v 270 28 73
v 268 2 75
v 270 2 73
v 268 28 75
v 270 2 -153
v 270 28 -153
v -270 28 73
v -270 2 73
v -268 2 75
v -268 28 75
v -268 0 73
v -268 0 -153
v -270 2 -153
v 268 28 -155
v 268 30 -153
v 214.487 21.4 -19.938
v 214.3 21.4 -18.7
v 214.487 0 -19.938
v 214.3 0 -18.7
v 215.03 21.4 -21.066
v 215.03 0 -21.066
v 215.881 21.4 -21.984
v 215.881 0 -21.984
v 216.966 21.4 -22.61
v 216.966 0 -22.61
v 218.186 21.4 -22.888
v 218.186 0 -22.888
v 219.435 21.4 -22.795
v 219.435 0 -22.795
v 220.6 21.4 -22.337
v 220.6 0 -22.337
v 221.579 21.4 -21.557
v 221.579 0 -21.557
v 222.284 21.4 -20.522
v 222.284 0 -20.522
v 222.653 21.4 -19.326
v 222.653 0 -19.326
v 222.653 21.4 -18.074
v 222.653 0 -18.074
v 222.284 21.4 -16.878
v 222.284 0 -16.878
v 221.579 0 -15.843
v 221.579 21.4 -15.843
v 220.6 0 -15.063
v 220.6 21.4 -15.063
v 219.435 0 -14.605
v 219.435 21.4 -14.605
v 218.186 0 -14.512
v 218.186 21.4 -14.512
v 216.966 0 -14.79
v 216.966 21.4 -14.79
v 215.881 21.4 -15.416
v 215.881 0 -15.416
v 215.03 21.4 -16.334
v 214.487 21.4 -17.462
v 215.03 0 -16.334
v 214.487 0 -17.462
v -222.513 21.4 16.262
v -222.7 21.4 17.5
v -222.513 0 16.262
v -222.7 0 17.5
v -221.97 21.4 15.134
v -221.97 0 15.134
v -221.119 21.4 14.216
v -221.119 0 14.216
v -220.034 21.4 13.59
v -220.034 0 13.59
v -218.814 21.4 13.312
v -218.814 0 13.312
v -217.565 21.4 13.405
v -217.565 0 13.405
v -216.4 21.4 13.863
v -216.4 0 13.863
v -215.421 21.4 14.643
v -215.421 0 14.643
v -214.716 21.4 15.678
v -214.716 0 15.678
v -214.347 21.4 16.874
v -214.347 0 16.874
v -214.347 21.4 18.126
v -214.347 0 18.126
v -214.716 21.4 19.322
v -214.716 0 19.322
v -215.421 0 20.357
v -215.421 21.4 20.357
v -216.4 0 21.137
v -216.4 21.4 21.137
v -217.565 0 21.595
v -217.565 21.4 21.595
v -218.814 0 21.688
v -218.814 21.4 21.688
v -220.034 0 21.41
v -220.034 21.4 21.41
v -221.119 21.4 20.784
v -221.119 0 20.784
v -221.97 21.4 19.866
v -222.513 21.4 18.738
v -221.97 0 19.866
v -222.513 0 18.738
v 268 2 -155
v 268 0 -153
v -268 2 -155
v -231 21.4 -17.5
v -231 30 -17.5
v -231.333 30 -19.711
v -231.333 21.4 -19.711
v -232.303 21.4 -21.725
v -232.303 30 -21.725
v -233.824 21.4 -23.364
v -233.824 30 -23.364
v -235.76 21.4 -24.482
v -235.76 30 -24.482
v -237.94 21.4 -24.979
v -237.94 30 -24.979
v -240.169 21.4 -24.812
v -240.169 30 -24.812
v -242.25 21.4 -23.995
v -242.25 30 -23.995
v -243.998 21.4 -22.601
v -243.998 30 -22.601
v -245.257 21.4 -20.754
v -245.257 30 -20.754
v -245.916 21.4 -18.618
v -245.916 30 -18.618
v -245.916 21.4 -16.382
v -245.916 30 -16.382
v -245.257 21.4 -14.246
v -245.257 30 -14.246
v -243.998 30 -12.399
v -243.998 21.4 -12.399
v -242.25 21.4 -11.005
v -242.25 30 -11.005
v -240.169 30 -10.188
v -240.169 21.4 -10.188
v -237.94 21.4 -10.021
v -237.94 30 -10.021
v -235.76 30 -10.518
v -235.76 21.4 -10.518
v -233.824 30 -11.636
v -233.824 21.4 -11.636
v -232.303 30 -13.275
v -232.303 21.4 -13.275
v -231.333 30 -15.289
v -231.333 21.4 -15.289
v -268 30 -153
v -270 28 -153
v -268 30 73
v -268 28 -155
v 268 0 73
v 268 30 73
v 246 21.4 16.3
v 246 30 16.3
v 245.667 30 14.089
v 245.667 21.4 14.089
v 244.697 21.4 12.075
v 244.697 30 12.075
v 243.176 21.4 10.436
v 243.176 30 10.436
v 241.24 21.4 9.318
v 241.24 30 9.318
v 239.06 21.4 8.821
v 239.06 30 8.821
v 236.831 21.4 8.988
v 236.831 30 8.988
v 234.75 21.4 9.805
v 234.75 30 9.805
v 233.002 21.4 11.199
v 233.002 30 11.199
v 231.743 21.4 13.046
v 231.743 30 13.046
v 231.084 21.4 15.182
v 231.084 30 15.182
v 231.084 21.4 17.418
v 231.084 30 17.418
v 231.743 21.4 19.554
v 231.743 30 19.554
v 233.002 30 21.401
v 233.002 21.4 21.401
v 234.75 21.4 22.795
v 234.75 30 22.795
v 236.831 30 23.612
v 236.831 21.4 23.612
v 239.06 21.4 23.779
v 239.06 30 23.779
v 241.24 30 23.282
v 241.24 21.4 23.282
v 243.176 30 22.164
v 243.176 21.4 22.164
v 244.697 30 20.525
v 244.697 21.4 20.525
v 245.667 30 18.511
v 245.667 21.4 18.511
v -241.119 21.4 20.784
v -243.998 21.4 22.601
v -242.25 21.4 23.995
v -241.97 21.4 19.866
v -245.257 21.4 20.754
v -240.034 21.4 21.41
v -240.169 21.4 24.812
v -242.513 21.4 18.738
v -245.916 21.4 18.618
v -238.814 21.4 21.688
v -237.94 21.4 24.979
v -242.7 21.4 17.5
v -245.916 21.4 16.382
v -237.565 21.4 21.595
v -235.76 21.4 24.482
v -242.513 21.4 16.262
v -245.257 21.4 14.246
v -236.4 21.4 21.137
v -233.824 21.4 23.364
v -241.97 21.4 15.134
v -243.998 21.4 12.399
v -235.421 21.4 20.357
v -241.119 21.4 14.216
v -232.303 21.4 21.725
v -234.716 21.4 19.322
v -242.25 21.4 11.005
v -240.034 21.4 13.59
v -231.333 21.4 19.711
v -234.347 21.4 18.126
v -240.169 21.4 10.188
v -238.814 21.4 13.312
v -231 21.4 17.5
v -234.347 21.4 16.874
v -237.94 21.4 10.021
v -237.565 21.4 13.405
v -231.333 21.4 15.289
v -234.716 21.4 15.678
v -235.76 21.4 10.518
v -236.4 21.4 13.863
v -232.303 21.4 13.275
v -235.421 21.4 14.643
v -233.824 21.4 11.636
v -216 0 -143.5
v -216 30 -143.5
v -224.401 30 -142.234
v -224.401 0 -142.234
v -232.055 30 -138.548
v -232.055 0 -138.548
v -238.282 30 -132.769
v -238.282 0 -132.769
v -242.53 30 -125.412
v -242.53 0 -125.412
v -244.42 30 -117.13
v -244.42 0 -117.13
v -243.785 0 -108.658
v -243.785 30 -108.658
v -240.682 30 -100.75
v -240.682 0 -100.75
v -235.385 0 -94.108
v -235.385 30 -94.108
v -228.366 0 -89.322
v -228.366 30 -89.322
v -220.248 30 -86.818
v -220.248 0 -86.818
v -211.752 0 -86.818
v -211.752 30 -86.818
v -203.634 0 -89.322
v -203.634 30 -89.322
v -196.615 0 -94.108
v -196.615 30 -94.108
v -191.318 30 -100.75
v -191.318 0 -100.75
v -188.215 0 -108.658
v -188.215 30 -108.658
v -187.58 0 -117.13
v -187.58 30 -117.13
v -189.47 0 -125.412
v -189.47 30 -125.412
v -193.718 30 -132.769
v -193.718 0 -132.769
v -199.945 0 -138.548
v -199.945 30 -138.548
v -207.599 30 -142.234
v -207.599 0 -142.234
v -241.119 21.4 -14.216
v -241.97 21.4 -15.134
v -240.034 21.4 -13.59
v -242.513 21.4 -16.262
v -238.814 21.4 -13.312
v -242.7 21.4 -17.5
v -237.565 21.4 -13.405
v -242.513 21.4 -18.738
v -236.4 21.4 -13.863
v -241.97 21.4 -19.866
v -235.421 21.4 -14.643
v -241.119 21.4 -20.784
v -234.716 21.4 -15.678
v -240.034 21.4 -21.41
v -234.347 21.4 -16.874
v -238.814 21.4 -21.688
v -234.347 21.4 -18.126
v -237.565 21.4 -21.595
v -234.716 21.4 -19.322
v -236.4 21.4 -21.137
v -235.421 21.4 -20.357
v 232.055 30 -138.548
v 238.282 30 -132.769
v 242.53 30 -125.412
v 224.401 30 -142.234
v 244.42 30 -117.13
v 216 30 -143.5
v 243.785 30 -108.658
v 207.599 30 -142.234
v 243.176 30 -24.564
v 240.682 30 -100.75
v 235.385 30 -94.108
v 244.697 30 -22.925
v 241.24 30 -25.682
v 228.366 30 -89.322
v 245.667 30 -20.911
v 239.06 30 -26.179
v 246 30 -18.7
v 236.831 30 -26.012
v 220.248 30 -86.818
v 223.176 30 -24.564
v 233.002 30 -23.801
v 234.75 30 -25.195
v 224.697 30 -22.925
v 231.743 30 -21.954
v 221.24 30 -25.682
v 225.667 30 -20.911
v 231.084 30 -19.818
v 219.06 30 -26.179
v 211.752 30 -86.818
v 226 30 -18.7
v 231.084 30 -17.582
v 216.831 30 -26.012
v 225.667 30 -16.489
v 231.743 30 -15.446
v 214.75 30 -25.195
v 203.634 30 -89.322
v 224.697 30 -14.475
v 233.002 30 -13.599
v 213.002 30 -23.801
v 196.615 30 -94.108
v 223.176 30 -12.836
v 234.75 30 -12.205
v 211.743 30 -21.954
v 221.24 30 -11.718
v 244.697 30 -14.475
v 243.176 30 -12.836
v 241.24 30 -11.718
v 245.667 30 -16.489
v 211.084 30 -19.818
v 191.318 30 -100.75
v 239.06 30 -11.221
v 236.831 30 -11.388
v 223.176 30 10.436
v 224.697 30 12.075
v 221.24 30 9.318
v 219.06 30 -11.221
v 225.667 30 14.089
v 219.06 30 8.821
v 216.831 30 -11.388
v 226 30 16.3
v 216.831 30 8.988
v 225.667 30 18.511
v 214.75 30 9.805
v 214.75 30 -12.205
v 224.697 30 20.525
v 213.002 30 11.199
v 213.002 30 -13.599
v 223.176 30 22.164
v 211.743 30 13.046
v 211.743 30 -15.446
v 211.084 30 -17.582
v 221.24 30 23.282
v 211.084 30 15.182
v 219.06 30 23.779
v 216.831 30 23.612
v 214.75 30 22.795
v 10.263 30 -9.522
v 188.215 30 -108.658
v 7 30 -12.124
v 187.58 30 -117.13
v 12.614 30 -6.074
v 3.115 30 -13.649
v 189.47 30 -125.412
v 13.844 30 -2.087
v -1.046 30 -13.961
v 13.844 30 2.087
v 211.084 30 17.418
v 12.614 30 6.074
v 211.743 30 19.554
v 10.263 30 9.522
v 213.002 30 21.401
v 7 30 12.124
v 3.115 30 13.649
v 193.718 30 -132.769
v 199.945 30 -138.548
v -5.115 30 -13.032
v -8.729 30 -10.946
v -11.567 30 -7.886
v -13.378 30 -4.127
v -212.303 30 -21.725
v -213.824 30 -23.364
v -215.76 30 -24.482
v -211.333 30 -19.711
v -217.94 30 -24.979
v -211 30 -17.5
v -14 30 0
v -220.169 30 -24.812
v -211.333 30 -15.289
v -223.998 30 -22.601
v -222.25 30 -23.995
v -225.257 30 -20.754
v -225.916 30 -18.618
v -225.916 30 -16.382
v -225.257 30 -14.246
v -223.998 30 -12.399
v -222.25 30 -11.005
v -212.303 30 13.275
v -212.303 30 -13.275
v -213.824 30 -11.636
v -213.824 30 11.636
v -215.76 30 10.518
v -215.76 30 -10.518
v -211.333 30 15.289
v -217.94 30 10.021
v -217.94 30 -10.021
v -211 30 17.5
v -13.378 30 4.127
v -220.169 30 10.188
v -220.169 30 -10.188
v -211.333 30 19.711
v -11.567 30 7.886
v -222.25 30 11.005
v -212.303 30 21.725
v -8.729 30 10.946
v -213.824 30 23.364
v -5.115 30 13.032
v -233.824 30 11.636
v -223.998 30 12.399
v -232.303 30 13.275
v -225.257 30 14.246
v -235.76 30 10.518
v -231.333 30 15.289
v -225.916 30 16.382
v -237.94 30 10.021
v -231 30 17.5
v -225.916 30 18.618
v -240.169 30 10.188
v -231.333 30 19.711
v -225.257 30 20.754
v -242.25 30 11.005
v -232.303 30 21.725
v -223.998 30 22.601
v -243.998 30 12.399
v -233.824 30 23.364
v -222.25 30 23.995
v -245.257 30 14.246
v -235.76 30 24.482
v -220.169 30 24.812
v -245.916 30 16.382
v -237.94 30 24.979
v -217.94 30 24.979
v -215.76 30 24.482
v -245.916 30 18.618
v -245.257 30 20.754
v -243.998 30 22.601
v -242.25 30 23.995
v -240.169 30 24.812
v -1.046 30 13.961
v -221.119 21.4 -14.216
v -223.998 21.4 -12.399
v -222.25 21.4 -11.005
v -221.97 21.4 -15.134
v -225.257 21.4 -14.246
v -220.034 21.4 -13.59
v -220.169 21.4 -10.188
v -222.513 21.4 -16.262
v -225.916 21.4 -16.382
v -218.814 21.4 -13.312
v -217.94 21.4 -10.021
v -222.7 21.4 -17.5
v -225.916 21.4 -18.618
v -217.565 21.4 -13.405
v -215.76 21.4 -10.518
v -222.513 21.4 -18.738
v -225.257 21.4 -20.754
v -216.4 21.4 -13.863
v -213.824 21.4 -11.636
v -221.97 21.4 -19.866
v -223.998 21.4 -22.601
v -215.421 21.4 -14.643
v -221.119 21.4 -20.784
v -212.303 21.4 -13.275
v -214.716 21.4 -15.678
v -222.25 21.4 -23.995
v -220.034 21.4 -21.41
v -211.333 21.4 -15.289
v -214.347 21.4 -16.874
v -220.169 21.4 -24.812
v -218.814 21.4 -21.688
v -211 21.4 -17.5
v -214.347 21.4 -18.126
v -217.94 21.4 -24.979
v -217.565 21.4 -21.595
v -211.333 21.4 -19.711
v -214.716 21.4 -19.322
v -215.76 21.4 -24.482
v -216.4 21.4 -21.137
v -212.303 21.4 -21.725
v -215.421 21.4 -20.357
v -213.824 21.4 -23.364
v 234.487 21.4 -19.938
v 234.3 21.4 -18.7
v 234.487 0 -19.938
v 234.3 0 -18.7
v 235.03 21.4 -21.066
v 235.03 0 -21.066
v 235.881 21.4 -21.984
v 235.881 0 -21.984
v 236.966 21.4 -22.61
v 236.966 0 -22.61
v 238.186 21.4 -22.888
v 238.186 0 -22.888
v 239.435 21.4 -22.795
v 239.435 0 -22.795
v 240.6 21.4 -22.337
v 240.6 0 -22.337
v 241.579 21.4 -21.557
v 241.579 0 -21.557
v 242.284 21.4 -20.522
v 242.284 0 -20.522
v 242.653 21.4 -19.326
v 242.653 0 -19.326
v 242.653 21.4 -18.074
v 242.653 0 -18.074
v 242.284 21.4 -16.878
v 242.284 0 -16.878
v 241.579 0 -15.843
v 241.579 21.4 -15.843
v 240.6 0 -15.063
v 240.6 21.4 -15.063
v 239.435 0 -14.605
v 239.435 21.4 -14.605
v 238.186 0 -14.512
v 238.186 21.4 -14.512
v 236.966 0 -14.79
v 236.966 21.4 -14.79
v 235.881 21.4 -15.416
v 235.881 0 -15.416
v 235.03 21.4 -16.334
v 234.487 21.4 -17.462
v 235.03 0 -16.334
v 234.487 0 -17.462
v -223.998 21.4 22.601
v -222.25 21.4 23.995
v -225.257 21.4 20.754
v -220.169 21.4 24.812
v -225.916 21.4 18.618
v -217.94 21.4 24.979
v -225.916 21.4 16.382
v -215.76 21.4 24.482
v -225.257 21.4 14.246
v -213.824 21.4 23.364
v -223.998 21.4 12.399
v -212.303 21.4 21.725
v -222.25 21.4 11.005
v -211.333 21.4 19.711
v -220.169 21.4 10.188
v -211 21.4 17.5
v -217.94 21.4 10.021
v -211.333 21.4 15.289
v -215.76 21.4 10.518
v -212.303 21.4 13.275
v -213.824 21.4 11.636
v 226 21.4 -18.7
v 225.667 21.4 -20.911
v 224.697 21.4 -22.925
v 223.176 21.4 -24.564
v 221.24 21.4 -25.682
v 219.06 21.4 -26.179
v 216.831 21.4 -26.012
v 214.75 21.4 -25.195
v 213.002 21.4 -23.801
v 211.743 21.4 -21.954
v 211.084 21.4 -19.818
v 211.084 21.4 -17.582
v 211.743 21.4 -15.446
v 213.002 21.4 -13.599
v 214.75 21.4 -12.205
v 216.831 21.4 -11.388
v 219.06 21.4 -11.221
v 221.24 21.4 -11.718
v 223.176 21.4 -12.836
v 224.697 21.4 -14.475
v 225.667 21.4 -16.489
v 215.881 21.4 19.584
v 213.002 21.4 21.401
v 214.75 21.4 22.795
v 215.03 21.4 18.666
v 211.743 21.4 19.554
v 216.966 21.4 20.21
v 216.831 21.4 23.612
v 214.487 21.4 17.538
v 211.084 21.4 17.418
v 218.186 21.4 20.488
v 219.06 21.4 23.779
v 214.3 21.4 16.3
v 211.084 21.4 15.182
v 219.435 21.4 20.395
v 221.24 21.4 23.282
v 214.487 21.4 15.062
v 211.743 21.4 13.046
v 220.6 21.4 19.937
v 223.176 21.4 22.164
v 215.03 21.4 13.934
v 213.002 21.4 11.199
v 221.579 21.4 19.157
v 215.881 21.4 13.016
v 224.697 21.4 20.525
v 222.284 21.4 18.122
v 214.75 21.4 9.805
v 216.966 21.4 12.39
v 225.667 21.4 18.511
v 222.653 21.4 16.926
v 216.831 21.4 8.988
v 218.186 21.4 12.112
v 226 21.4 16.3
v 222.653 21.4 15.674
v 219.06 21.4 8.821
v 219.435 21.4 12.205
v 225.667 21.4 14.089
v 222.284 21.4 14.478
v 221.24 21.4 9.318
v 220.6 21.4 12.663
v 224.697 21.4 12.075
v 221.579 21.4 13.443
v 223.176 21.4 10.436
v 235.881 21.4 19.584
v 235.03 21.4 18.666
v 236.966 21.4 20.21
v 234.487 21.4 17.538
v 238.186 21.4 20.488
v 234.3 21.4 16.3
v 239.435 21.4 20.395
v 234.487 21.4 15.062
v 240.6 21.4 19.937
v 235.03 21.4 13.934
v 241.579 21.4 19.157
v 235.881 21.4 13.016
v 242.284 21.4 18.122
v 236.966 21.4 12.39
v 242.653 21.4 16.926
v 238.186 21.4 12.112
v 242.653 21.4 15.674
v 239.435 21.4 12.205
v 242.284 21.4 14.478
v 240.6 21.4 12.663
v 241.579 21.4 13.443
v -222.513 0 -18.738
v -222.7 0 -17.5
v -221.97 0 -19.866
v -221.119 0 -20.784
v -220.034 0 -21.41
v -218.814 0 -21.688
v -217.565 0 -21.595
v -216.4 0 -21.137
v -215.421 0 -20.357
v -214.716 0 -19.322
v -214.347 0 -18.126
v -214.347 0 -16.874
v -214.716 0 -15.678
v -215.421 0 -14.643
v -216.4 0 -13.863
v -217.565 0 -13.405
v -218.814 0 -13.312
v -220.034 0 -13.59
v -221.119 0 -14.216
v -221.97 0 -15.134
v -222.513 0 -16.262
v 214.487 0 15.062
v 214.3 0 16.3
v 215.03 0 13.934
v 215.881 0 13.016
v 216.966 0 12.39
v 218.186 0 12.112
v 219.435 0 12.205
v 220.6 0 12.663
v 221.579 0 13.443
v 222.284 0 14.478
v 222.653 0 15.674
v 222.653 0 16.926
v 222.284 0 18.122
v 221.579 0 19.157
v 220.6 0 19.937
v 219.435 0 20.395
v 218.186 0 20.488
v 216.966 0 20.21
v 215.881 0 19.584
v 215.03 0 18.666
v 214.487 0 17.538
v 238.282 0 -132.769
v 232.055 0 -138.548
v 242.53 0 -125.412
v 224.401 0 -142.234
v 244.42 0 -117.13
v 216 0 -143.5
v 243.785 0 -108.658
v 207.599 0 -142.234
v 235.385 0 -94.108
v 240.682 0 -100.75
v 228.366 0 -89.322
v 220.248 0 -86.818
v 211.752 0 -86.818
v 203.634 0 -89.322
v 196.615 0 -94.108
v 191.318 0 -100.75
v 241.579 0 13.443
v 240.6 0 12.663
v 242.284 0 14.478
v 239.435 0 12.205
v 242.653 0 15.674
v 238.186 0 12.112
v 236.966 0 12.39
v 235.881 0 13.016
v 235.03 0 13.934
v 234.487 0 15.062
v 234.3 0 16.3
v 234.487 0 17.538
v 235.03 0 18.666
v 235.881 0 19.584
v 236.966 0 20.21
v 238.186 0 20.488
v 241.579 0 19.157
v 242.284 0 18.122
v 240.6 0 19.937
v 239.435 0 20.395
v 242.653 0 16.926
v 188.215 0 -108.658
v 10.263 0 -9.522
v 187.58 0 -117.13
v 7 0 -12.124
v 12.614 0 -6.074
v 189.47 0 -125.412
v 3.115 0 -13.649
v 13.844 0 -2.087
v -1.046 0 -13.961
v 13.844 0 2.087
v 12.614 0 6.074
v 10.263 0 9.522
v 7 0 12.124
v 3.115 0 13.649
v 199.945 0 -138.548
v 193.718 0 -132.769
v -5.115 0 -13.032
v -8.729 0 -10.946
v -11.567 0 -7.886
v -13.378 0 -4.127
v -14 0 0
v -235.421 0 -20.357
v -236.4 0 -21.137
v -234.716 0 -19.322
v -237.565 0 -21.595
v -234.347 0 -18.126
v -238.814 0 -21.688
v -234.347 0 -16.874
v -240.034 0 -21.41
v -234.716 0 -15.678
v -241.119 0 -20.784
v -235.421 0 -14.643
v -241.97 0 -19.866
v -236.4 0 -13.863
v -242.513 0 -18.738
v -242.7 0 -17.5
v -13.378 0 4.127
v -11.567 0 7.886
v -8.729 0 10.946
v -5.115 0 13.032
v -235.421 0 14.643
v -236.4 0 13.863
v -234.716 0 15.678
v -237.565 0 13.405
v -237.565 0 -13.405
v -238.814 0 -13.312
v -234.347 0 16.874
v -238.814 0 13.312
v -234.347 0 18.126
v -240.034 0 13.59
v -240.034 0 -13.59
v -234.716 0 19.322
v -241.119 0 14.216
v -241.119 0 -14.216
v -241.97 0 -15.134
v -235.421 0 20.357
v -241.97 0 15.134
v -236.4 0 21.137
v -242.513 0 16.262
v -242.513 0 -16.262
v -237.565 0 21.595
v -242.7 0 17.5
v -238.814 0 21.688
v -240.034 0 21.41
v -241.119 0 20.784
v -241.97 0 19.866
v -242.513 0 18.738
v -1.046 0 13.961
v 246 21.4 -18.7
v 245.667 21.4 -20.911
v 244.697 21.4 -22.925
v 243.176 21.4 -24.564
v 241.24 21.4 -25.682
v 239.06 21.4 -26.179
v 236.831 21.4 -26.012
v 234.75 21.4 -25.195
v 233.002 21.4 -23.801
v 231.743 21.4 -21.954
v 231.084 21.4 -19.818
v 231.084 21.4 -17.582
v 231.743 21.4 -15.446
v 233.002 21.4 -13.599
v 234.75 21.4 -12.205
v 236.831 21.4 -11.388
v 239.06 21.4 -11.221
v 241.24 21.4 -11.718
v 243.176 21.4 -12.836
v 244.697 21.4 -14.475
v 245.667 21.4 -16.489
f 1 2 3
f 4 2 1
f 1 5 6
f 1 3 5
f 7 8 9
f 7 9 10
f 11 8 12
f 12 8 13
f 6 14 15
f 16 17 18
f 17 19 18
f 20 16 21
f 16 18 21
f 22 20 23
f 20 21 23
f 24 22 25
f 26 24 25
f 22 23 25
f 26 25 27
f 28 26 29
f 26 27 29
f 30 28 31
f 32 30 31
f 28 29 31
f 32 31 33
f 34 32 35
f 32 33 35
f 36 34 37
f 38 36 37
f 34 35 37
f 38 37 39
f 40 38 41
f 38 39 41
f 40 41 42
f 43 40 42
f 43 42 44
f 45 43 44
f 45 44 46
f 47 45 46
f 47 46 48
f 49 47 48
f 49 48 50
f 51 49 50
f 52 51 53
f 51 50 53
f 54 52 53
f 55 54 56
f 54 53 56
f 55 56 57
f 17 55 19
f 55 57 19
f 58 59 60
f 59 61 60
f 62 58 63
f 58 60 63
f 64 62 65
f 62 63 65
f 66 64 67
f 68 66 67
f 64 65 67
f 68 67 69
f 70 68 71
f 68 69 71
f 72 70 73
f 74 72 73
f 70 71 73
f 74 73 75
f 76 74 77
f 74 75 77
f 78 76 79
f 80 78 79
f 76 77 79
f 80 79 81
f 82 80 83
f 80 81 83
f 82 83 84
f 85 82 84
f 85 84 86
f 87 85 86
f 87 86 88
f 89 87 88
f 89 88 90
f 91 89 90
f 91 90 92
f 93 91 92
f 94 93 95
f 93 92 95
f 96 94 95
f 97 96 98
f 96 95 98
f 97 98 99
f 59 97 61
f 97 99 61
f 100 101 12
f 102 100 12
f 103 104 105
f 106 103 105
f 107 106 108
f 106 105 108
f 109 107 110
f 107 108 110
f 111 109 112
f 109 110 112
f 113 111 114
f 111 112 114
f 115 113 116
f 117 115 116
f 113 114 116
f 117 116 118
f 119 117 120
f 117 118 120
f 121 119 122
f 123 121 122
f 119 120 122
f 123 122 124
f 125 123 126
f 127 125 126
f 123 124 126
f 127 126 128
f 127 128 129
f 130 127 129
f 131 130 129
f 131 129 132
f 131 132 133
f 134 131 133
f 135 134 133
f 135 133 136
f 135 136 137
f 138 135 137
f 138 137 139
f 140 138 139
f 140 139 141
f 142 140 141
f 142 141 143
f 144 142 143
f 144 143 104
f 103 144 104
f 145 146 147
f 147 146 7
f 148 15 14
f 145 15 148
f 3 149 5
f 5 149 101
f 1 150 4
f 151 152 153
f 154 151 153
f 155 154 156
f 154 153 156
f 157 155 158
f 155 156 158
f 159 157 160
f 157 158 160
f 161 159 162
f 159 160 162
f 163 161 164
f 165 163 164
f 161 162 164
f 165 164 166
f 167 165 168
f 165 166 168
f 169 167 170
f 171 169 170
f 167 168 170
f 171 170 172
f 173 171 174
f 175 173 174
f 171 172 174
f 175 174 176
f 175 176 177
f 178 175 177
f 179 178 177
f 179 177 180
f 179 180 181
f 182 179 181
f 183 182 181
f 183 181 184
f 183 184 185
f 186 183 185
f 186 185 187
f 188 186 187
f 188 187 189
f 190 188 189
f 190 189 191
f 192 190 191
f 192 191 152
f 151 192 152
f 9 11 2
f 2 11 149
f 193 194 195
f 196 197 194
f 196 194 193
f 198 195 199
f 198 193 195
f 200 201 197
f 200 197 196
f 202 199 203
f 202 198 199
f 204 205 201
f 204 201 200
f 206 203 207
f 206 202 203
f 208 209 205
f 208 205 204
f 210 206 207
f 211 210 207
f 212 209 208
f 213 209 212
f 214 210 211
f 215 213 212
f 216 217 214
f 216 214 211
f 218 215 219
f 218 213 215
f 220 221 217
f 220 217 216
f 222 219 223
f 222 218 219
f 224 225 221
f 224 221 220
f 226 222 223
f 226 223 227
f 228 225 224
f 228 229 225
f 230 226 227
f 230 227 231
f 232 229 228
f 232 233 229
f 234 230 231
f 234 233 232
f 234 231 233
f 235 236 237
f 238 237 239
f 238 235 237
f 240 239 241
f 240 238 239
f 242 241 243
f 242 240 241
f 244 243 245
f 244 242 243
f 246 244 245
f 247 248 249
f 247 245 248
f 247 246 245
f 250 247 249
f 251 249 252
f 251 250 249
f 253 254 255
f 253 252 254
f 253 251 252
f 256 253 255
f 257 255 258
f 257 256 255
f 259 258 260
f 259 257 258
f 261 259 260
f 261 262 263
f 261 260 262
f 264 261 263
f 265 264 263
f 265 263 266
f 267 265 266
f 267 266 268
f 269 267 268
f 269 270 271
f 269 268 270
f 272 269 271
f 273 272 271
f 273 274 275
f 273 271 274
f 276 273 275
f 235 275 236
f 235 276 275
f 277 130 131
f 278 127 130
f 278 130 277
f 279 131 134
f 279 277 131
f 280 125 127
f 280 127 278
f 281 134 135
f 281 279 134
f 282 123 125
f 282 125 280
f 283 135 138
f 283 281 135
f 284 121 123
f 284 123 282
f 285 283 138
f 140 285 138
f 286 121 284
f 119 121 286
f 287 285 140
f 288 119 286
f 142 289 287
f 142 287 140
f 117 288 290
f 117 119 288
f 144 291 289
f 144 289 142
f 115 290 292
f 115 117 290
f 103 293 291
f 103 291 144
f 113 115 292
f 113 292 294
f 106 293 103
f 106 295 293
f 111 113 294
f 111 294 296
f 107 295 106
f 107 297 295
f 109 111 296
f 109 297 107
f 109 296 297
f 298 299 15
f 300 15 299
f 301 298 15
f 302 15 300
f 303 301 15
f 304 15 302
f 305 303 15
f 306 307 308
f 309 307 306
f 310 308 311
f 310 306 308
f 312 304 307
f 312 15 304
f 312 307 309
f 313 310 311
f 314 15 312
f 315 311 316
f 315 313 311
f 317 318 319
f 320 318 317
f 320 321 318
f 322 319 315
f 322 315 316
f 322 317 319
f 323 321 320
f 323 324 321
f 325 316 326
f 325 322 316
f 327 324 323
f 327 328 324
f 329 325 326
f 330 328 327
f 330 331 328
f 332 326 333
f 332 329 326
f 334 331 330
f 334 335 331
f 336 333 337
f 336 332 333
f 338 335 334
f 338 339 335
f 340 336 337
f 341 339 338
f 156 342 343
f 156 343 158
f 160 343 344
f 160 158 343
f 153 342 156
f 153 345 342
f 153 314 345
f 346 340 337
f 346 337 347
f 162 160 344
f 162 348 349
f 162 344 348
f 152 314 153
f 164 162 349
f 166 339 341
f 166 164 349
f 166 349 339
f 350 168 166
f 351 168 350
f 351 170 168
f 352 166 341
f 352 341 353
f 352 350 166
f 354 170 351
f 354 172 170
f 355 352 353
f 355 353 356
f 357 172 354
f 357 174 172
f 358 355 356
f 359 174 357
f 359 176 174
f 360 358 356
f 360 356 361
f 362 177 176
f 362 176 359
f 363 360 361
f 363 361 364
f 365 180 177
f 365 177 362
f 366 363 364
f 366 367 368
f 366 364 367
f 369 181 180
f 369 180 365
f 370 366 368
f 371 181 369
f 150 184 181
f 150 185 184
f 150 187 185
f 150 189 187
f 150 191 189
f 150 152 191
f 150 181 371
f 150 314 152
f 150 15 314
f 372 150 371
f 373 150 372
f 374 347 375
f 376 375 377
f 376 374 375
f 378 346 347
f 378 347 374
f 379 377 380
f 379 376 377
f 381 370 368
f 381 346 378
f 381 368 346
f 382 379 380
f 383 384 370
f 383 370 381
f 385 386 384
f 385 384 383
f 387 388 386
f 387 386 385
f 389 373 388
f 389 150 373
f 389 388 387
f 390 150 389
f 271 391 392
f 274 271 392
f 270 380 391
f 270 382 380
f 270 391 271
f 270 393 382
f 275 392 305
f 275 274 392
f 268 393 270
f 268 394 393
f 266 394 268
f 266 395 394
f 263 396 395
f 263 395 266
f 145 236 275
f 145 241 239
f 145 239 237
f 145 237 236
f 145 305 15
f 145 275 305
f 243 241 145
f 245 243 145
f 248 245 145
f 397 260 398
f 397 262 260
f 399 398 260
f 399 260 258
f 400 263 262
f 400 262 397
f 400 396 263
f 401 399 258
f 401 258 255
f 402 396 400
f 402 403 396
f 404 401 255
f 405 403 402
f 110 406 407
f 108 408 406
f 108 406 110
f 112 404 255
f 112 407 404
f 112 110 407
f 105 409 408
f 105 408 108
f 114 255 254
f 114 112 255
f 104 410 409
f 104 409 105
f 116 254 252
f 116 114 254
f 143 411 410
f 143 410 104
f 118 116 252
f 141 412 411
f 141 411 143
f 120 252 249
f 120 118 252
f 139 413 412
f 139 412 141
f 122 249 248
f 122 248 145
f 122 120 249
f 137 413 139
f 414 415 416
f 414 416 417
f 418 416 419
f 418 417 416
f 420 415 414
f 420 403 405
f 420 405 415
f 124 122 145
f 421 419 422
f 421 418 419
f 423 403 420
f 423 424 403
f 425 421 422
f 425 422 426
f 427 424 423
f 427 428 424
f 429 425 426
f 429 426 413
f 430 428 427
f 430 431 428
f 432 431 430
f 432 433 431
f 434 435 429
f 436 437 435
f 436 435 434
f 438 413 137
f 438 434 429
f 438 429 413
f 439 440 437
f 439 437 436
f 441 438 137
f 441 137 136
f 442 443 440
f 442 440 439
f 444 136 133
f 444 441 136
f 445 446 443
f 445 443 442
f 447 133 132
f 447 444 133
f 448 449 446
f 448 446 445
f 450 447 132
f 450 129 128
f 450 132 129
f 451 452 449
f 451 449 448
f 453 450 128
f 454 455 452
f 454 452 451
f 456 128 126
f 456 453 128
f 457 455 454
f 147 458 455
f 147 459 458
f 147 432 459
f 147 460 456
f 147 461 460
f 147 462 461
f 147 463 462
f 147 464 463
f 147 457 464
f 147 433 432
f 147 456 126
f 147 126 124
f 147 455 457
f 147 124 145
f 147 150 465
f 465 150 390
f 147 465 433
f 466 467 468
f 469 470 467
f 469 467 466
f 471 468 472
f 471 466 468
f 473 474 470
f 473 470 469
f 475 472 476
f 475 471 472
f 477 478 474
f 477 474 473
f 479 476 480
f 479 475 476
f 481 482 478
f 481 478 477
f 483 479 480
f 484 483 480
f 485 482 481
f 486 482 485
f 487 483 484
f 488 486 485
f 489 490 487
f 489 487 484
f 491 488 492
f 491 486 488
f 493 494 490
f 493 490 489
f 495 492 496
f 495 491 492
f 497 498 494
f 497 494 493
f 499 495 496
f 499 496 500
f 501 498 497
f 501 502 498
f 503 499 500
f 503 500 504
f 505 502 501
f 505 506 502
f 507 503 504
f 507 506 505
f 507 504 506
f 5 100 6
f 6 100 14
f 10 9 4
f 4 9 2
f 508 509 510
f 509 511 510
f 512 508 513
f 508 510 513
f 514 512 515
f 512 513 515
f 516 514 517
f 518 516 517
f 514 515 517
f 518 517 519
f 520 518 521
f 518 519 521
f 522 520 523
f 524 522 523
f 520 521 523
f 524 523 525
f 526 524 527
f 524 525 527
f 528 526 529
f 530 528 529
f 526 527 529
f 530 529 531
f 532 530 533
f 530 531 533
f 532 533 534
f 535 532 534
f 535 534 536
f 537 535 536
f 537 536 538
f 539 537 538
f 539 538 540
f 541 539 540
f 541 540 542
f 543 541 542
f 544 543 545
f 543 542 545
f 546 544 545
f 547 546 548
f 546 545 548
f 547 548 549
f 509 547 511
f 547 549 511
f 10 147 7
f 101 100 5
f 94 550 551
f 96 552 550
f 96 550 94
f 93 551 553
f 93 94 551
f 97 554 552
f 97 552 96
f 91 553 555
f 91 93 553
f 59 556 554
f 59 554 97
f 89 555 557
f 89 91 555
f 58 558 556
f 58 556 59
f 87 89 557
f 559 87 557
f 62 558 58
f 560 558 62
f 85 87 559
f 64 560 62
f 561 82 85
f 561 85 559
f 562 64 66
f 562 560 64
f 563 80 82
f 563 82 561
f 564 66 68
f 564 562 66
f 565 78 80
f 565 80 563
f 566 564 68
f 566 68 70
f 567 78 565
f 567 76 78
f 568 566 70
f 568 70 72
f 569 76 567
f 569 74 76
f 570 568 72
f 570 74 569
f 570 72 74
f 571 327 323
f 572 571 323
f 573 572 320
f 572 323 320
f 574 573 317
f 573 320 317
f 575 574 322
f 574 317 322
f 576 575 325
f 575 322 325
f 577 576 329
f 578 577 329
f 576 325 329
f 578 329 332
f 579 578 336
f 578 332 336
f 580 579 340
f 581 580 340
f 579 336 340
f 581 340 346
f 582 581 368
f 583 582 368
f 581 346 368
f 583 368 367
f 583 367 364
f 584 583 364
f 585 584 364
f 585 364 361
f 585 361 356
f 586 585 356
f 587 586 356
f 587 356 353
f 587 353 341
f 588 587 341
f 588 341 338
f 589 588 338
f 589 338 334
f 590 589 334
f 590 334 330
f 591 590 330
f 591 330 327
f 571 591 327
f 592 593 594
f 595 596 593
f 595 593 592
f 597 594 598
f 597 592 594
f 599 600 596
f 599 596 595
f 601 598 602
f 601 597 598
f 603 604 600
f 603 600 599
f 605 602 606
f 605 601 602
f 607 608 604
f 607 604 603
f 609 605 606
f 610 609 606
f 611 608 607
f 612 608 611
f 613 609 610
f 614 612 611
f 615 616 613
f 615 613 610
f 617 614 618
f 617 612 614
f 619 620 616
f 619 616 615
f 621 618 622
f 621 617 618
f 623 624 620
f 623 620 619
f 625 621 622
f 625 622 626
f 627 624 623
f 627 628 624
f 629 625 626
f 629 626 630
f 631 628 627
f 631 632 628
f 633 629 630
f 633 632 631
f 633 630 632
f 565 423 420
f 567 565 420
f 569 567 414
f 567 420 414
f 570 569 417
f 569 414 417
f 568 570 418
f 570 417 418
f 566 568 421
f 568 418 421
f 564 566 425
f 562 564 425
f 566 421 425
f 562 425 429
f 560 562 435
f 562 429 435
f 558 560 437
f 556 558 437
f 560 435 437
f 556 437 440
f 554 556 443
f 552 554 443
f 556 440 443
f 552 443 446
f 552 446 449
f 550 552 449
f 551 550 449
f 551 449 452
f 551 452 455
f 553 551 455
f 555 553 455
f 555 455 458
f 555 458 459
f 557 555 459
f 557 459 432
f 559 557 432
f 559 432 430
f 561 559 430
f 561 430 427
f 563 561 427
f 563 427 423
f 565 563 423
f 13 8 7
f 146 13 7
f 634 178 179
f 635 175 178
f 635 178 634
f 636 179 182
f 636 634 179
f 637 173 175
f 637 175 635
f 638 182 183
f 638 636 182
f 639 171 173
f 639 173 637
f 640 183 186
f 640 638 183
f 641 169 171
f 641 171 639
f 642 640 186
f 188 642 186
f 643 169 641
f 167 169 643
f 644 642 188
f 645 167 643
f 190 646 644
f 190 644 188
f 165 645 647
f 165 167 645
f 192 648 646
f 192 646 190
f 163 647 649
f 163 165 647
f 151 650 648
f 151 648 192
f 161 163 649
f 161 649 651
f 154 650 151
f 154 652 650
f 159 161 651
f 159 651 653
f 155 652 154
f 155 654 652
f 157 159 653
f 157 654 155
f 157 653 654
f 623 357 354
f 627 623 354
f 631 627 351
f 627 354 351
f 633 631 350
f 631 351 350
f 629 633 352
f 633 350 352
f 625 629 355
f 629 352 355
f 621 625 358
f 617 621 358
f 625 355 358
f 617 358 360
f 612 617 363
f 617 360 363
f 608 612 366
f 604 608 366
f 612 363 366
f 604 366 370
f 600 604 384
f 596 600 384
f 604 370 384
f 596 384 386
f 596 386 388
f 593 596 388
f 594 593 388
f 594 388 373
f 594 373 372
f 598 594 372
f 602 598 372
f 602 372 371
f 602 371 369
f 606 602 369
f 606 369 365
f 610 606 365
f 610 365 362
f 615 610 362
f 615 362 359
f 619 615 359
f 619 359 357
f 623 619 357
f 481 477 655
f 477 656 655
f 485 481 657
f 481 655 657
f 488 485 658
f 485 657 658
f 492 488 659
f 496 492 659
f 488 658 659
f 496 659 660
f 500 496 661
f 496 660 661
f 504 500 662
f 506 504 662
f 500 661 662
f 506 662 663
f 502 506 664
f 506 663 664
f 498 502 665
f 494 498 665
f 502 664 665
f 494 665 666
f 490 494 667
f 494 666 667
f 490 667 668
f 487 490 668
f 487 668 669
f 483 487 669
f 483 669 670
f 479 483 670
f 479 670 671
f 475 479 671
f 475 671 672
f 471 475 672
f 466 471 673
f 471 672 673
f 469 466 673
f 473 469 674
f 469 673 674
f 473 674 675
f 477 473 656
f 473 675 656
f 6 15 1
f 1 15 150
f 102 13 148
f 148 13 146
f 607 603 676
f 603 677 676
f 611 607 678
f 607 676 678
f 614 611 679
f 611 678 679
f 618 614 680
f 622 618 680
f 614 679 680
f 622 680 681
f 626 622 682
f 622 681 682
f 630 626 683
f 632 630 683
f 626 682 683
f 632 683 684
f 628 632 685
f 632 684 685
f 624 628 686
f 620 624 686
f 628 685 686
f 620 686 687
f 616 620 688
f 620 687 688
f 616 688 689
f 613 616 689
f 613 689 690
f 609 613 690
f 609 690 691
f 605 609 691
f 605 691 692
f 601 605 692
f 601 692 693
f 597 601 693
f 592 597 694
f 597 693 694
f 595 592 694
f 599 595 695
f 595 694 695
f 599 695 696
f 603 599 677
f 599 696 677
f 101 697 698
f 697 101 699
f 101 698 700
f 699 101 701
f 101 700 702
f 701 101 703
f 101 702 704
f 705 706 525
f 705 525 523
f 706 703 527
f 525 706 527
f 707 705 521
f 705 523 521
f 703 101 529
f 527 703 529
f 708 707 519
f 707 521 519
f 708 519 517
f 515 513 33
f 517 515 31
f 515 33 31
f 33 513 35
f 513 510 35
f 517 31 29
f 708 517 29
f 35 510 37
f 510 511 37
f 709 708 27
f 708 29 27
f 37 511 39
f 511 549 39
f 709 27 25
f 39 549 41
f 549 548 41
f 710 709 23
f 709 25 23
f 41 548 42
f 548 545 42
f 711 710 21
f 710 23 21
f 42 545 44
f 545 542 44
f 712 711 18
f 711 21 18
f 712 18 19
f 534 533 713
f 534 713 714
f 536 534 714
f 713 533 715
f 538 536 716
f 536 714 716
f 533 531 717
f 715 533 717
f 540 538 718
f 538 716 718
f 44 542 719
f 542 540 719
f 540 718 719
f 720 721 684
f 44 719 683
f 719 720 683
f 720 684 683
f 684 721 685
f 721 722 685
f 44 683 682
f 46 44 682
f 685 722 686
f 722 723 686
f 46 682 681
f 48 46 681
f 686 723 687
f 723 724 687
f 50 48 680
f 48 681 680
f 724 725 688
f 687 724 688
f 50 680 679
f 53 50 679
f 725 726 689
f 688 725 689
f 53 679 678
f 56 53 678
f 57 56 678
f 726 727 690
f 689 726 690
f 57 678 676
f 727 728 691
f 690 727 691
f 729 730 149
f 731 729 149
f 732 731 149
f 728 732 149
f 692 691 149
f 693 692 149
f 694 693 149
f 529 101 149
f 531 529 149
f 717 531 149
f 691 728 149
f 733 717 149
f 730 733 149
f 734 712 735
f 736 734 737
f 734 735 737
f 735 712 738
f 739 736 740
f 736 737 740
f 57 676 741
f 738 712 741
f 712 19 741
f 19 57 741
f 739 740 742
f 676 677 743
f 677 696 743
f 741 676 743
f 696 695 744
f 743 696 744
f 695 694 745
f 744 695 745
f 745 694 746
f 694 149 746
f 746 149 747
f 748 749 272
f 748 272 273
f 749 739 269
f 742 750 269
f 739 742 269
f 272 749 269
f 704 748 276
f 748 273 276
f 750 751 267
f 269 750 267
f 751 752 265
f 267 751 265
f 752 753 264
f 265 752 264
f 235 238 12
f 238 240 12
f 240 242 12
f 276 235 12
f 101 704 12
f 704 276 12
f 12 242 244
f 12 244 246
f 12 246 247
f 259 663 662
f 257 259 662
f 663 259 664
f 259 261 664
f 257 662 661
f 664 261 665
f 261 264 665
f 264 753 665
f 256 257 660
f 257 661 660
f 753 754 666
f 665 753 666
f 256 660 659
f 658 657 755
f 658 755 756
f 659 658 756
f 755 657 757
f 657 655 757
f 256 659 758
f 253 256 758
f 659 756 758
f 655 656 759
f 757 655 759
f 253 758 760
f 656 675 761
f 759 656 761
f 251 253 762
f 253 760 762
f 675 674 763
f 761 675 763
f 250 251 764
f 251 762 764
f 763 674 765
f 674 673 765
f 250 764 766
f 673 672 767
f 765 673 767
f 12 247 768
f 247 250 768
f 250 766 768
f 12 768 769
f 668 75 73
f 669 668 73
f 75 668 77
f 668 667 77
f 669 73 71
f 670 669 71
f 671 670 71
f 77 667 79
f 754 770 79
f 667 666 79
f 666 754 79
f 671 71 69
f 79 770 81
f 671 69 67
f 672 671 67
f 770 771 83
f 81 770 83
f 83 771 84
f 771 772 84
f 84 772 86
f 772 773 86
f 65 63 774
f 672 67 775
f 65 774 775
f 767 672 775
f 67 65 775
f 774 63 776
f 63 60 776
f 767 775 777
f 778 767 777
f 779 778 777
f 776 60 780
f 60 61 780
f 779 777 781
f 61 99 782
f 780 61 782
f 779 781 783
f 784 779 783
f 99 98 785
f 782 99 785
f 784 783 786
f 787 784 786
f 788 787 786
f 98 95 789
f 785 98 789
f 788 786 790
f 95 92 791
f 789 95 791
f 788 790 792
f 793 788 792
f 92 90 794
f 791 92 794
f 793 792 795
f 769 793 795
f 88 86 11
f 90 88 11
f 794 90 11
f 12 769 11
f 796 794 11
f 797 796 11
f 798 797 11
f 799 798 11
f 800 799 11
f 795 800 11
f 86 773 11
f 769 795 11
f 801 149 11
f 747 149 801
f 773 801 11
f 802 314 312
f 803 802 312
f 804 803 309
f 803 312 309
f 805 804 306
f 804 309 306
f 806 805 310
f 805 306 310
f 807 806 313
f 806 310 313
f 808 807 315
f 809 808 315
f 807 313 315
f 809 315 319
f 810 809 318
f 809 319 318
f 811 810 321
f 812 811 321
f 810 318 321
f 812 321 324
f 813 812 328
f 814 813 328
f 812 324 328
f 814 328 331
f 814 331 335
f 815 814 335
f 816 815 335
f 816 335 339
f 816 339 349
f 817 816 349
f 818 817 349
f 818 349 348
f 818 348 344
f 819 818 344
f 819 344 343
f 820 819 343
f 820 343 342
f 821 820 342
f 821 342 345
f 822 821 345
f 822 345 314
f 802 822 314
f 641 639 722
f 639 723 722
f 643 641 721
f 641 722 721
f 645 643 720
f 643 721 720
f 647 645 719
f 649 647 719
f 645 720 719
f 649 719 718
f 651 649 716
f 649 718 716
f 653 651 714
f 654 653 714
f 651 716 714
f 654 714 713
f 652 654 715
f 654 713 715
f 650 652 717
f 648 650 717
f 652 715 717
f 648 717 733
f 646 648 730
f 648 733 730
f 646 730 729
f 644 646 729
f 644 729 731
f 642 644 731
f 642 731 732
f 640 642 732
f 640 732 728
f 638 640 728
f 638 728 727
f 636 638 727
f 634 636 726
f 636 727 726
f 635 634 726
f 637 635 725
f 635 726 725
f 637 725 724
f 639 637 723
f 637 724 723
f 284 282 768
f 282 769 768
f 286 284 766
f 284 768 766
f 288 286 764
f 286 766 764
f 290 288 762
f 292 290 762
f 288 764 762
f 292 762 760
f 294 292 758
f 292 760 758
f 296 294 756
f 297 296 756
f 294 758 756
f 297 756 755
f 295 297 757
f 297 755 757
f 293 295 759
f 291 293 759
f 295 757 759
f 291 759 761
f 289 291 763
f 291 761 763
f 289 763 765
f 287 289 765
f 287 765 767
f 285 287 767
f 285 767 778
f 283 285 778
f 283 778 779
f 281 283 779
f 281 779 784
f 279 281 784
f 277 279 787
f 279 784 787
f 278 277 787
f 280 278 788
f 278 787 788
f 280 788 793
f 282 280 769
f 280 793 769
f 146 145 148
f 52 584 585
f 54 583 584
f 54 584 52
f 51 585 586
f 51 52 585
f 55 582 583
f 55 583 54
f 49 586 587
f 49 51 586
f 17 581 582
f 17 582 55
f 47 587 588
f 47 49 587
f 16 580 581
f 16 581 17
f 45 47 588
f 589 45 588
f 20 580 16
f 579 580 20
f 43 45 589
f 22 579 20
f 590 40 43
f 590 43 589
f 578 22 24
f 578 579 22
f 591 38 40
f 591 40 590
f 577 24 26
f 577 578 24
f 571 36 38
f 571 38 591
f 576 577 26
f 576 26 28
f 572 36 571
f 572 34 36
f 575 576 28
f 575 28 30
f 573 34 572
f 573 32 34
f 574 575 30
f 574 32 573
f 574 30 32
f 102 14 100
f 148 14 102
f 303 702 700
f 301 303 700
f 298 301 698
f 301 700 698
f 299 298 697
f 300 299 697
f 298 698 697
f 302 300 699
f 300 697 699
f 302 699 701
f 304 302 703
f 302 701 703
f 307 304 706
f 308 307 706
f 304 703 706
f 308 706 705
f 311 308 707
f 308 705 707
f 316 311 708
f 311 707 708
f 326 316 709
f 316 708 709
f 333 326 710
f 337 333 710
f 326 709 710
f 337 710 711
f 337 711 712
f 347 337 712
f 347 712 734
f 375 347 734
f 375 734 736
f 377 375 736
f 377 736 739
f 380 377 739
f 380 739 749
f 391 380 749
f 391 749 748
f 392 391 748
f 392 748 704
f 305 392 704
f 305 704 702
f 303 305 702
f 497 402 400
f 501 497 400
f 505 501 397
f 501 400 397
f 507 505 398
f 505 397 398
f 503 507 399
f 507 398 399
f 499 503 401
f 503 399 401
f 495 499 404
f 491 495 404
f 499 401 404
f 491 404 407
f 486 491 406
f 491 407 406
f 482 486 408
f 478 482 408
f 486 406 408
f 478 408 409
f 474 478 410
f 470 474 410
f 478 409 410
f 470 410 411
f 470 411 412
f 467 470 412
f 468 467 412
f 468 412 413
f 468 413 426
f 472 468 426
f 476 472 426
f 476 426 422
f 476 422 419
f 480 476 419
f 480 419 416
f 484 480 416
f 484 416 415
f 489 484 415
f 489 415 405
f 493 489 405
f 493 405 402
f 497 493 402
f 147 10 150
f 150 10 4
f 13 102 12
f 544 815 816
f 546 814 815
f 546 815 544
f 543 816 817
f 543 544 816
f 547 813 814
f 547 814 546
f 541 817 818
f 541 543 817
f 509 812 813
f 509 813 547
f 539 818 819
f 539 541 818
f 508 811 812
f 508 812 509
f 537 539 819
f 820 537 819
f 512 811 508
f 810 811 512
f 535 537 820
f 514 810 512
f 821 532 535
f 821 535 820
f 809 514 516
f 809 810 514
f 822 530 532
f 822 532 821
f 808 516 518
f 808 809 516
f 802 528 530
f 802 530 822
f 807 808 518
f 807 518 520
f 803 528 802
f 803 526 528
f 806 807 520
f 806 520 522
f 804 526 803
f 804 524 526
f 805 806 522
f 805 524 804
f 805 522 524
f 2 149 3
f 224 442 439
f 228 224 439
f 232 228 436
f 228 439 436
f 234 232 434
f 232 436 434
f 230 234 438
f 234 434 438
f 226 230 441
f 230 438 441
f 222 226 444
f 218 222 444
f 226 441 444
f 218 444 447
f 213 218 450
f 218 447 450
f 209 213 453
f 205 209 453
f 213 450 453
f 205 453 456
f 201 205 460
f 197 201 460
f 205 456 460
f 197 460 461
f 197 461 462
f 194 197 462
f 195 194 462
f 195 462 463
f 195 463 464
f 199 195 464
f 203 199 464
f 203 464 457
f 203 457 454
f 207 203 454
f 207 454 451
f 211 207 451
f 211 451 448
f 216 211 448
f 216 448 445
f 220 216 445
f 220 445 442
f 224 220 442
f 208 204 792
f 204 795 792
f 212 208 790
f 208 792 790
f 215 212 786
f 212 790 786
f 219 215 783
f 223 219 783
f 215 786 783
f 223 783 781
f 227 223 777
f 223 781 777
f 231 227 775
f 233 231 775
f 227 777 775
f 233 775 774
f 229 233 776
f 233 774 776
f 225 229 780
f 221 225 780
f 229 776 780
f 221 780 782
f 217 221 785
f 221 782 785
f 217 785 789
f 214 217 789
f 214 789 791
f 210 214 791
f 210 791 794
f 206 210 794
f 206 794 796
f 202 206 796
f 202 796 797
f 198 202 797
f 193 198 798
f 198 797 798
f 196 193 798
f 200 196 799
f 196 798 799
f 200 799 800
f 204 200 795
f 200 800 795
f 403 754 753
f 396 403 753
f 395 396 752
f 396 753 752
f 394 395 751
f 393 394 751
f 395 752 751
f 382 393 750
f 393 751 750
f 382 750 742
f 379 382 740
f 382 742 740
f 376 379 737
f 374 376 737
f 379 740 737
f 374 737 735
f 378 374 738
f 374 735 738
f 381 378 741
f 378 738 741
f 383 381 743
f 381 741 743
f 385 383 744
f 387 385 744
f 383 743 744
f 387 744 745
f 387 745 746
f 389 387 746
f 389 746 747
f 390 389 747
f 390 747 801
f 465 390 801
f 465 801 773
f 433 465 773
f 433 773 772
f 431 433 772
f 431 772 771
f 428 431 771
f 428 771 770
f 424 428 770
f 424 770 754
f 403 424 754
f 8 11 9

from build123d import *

# Parameters (mm, degrees)
SKETCH2_W                                           = 540
SKETCH2_H                                           = 150
BOSS_EXTRUDE1_DEPTH                                 = 30
SKETCH3_W                                           = 540
SKETCH3_H                                           = 30
BOSS_EXTRUDE2_DEPTH                                 = 80
SKETCH6_R                                           = 28.5
CUT_EXTRUDE1_DEPTH                                  = 313.769883461
CHAMFER1_SIZE                                       = 2
M30X2_0_TAPPED_HOLE1_D                              = 28
CBORE_FOR_M8_HEX_SOCKET_HEAD_CAP_SCREW1_D           = 8.4
CBORE_FOR_M8_HEX_SOCKET_HEAD_CAP_SCREW1_CBORE_D     = 15
CBORE_FOR_M8_HEX_SOCKET_HEAD_CAP_SCREW1_CBORE_DEPTH = 8.6


with BuildPart() as part:
    # Sketch2 → Boss-Extrude1 (new body)
    with BuildSketch(Plane(origin=(0, 0, 0), x_dir=(1, 0, 0), z_dir=(0, 1, 0))):
        Rectangle(SKETCH2_W, SKETCH2_H)
    extrude(amount=BOSS_EXTRUDE1_DEPTH)

    # Sketch3 → Boss-Extrude2 (add)
    with BuildSketch(Plane(origin=(0, 0, -75), x_dir=(-1, 0, 0), z_dir=(0, 0, -1))):
        with Locations((0, 15)):
            Rectangle(SKETCH3_W, SKETCH3_H)
    extrude(amount=BOSS_EXTRUDE2_DEPTH)

    # Sketch6 → Cut-Extrude1 (cut, through all)
    with BuildSketch(Plane(origin=(0, 0, 0), x_dir=(-1, 0, 0), z_dir=(0, -1, 0))):
        with Locations(Location((-216, 115, 0), (0, 0, 90))):
            Circle(SKETCH6_R)
    cut_extrude1 = extrude(amount=-CUT_EXTRUDE1_DEPTH, mode=Mode.SUBTRACT)

    # Mirror1: Cut-Extrude1 across plane
    add(cut_extrude1.mirror(Plane(origin=(0, 0, 0), x_dir=(0, 0, 1), z_dir=(1, 0, 0))), mode=Mode.SUBTRACT)

    # Chamfer1
    chamfer1_edges = [part.edges().sort_by_distance(p)[0] for p in [
        (-270, 30, -40),
        (0, 30, -155),
        (270, 15, -155),
        (0, 0, -155),
        (0, 30, 75),
        (-270, 15, -155),
        (270, 30, -40),
        (0, 0, 75),
        (-270, 0, -40),
        (270, 0, -40),
        (270, 15, 75),
        (-270, 15, 75),
    ]]
    chamfer(chamfer1_edges, length=CHAMFER1_SIZE)

    # M30x2.0 Tapped Hole1 (through all)
    with Locations(Plane(origin=(0, 30, 0), x_dir=(1, 0, 0), z_dir=(0, 1, 0))):
        with Locations((0, 0)):
            Hole(M30X2_0_TAPPED_HOLE1_D / 2)

    # CBORE for M8 Hex Socket Head Cap Screw1 (through all)
    with Locations(Plane(origin=(0, 30, 0), x_dir=(1, 0, 0), z_dir=(0, 1, 0))):
        with Locations((-238.5, 17.5), (-218.5, 17.5), (-238.5, -17.5), (-218.5, -17.5), (218.5, 18.7), (238.5, 18.7), (218.5, -16.3), (238.5, -16.3)):
            CounterBoreHole(CBORE_FOR_M8_HEX_SOCKET_HEAD_CAP_SCREW1_D / 2, CBORE_FOR_M8_HEX_SOCKET_HEAD_CAP_SCREW1_CBORE_D / 2, CBORE_FOR_M8_HEX_SOCKET_HEAD_CAP_SCREW1_CBORE_DEPTH)


solid = part.part
